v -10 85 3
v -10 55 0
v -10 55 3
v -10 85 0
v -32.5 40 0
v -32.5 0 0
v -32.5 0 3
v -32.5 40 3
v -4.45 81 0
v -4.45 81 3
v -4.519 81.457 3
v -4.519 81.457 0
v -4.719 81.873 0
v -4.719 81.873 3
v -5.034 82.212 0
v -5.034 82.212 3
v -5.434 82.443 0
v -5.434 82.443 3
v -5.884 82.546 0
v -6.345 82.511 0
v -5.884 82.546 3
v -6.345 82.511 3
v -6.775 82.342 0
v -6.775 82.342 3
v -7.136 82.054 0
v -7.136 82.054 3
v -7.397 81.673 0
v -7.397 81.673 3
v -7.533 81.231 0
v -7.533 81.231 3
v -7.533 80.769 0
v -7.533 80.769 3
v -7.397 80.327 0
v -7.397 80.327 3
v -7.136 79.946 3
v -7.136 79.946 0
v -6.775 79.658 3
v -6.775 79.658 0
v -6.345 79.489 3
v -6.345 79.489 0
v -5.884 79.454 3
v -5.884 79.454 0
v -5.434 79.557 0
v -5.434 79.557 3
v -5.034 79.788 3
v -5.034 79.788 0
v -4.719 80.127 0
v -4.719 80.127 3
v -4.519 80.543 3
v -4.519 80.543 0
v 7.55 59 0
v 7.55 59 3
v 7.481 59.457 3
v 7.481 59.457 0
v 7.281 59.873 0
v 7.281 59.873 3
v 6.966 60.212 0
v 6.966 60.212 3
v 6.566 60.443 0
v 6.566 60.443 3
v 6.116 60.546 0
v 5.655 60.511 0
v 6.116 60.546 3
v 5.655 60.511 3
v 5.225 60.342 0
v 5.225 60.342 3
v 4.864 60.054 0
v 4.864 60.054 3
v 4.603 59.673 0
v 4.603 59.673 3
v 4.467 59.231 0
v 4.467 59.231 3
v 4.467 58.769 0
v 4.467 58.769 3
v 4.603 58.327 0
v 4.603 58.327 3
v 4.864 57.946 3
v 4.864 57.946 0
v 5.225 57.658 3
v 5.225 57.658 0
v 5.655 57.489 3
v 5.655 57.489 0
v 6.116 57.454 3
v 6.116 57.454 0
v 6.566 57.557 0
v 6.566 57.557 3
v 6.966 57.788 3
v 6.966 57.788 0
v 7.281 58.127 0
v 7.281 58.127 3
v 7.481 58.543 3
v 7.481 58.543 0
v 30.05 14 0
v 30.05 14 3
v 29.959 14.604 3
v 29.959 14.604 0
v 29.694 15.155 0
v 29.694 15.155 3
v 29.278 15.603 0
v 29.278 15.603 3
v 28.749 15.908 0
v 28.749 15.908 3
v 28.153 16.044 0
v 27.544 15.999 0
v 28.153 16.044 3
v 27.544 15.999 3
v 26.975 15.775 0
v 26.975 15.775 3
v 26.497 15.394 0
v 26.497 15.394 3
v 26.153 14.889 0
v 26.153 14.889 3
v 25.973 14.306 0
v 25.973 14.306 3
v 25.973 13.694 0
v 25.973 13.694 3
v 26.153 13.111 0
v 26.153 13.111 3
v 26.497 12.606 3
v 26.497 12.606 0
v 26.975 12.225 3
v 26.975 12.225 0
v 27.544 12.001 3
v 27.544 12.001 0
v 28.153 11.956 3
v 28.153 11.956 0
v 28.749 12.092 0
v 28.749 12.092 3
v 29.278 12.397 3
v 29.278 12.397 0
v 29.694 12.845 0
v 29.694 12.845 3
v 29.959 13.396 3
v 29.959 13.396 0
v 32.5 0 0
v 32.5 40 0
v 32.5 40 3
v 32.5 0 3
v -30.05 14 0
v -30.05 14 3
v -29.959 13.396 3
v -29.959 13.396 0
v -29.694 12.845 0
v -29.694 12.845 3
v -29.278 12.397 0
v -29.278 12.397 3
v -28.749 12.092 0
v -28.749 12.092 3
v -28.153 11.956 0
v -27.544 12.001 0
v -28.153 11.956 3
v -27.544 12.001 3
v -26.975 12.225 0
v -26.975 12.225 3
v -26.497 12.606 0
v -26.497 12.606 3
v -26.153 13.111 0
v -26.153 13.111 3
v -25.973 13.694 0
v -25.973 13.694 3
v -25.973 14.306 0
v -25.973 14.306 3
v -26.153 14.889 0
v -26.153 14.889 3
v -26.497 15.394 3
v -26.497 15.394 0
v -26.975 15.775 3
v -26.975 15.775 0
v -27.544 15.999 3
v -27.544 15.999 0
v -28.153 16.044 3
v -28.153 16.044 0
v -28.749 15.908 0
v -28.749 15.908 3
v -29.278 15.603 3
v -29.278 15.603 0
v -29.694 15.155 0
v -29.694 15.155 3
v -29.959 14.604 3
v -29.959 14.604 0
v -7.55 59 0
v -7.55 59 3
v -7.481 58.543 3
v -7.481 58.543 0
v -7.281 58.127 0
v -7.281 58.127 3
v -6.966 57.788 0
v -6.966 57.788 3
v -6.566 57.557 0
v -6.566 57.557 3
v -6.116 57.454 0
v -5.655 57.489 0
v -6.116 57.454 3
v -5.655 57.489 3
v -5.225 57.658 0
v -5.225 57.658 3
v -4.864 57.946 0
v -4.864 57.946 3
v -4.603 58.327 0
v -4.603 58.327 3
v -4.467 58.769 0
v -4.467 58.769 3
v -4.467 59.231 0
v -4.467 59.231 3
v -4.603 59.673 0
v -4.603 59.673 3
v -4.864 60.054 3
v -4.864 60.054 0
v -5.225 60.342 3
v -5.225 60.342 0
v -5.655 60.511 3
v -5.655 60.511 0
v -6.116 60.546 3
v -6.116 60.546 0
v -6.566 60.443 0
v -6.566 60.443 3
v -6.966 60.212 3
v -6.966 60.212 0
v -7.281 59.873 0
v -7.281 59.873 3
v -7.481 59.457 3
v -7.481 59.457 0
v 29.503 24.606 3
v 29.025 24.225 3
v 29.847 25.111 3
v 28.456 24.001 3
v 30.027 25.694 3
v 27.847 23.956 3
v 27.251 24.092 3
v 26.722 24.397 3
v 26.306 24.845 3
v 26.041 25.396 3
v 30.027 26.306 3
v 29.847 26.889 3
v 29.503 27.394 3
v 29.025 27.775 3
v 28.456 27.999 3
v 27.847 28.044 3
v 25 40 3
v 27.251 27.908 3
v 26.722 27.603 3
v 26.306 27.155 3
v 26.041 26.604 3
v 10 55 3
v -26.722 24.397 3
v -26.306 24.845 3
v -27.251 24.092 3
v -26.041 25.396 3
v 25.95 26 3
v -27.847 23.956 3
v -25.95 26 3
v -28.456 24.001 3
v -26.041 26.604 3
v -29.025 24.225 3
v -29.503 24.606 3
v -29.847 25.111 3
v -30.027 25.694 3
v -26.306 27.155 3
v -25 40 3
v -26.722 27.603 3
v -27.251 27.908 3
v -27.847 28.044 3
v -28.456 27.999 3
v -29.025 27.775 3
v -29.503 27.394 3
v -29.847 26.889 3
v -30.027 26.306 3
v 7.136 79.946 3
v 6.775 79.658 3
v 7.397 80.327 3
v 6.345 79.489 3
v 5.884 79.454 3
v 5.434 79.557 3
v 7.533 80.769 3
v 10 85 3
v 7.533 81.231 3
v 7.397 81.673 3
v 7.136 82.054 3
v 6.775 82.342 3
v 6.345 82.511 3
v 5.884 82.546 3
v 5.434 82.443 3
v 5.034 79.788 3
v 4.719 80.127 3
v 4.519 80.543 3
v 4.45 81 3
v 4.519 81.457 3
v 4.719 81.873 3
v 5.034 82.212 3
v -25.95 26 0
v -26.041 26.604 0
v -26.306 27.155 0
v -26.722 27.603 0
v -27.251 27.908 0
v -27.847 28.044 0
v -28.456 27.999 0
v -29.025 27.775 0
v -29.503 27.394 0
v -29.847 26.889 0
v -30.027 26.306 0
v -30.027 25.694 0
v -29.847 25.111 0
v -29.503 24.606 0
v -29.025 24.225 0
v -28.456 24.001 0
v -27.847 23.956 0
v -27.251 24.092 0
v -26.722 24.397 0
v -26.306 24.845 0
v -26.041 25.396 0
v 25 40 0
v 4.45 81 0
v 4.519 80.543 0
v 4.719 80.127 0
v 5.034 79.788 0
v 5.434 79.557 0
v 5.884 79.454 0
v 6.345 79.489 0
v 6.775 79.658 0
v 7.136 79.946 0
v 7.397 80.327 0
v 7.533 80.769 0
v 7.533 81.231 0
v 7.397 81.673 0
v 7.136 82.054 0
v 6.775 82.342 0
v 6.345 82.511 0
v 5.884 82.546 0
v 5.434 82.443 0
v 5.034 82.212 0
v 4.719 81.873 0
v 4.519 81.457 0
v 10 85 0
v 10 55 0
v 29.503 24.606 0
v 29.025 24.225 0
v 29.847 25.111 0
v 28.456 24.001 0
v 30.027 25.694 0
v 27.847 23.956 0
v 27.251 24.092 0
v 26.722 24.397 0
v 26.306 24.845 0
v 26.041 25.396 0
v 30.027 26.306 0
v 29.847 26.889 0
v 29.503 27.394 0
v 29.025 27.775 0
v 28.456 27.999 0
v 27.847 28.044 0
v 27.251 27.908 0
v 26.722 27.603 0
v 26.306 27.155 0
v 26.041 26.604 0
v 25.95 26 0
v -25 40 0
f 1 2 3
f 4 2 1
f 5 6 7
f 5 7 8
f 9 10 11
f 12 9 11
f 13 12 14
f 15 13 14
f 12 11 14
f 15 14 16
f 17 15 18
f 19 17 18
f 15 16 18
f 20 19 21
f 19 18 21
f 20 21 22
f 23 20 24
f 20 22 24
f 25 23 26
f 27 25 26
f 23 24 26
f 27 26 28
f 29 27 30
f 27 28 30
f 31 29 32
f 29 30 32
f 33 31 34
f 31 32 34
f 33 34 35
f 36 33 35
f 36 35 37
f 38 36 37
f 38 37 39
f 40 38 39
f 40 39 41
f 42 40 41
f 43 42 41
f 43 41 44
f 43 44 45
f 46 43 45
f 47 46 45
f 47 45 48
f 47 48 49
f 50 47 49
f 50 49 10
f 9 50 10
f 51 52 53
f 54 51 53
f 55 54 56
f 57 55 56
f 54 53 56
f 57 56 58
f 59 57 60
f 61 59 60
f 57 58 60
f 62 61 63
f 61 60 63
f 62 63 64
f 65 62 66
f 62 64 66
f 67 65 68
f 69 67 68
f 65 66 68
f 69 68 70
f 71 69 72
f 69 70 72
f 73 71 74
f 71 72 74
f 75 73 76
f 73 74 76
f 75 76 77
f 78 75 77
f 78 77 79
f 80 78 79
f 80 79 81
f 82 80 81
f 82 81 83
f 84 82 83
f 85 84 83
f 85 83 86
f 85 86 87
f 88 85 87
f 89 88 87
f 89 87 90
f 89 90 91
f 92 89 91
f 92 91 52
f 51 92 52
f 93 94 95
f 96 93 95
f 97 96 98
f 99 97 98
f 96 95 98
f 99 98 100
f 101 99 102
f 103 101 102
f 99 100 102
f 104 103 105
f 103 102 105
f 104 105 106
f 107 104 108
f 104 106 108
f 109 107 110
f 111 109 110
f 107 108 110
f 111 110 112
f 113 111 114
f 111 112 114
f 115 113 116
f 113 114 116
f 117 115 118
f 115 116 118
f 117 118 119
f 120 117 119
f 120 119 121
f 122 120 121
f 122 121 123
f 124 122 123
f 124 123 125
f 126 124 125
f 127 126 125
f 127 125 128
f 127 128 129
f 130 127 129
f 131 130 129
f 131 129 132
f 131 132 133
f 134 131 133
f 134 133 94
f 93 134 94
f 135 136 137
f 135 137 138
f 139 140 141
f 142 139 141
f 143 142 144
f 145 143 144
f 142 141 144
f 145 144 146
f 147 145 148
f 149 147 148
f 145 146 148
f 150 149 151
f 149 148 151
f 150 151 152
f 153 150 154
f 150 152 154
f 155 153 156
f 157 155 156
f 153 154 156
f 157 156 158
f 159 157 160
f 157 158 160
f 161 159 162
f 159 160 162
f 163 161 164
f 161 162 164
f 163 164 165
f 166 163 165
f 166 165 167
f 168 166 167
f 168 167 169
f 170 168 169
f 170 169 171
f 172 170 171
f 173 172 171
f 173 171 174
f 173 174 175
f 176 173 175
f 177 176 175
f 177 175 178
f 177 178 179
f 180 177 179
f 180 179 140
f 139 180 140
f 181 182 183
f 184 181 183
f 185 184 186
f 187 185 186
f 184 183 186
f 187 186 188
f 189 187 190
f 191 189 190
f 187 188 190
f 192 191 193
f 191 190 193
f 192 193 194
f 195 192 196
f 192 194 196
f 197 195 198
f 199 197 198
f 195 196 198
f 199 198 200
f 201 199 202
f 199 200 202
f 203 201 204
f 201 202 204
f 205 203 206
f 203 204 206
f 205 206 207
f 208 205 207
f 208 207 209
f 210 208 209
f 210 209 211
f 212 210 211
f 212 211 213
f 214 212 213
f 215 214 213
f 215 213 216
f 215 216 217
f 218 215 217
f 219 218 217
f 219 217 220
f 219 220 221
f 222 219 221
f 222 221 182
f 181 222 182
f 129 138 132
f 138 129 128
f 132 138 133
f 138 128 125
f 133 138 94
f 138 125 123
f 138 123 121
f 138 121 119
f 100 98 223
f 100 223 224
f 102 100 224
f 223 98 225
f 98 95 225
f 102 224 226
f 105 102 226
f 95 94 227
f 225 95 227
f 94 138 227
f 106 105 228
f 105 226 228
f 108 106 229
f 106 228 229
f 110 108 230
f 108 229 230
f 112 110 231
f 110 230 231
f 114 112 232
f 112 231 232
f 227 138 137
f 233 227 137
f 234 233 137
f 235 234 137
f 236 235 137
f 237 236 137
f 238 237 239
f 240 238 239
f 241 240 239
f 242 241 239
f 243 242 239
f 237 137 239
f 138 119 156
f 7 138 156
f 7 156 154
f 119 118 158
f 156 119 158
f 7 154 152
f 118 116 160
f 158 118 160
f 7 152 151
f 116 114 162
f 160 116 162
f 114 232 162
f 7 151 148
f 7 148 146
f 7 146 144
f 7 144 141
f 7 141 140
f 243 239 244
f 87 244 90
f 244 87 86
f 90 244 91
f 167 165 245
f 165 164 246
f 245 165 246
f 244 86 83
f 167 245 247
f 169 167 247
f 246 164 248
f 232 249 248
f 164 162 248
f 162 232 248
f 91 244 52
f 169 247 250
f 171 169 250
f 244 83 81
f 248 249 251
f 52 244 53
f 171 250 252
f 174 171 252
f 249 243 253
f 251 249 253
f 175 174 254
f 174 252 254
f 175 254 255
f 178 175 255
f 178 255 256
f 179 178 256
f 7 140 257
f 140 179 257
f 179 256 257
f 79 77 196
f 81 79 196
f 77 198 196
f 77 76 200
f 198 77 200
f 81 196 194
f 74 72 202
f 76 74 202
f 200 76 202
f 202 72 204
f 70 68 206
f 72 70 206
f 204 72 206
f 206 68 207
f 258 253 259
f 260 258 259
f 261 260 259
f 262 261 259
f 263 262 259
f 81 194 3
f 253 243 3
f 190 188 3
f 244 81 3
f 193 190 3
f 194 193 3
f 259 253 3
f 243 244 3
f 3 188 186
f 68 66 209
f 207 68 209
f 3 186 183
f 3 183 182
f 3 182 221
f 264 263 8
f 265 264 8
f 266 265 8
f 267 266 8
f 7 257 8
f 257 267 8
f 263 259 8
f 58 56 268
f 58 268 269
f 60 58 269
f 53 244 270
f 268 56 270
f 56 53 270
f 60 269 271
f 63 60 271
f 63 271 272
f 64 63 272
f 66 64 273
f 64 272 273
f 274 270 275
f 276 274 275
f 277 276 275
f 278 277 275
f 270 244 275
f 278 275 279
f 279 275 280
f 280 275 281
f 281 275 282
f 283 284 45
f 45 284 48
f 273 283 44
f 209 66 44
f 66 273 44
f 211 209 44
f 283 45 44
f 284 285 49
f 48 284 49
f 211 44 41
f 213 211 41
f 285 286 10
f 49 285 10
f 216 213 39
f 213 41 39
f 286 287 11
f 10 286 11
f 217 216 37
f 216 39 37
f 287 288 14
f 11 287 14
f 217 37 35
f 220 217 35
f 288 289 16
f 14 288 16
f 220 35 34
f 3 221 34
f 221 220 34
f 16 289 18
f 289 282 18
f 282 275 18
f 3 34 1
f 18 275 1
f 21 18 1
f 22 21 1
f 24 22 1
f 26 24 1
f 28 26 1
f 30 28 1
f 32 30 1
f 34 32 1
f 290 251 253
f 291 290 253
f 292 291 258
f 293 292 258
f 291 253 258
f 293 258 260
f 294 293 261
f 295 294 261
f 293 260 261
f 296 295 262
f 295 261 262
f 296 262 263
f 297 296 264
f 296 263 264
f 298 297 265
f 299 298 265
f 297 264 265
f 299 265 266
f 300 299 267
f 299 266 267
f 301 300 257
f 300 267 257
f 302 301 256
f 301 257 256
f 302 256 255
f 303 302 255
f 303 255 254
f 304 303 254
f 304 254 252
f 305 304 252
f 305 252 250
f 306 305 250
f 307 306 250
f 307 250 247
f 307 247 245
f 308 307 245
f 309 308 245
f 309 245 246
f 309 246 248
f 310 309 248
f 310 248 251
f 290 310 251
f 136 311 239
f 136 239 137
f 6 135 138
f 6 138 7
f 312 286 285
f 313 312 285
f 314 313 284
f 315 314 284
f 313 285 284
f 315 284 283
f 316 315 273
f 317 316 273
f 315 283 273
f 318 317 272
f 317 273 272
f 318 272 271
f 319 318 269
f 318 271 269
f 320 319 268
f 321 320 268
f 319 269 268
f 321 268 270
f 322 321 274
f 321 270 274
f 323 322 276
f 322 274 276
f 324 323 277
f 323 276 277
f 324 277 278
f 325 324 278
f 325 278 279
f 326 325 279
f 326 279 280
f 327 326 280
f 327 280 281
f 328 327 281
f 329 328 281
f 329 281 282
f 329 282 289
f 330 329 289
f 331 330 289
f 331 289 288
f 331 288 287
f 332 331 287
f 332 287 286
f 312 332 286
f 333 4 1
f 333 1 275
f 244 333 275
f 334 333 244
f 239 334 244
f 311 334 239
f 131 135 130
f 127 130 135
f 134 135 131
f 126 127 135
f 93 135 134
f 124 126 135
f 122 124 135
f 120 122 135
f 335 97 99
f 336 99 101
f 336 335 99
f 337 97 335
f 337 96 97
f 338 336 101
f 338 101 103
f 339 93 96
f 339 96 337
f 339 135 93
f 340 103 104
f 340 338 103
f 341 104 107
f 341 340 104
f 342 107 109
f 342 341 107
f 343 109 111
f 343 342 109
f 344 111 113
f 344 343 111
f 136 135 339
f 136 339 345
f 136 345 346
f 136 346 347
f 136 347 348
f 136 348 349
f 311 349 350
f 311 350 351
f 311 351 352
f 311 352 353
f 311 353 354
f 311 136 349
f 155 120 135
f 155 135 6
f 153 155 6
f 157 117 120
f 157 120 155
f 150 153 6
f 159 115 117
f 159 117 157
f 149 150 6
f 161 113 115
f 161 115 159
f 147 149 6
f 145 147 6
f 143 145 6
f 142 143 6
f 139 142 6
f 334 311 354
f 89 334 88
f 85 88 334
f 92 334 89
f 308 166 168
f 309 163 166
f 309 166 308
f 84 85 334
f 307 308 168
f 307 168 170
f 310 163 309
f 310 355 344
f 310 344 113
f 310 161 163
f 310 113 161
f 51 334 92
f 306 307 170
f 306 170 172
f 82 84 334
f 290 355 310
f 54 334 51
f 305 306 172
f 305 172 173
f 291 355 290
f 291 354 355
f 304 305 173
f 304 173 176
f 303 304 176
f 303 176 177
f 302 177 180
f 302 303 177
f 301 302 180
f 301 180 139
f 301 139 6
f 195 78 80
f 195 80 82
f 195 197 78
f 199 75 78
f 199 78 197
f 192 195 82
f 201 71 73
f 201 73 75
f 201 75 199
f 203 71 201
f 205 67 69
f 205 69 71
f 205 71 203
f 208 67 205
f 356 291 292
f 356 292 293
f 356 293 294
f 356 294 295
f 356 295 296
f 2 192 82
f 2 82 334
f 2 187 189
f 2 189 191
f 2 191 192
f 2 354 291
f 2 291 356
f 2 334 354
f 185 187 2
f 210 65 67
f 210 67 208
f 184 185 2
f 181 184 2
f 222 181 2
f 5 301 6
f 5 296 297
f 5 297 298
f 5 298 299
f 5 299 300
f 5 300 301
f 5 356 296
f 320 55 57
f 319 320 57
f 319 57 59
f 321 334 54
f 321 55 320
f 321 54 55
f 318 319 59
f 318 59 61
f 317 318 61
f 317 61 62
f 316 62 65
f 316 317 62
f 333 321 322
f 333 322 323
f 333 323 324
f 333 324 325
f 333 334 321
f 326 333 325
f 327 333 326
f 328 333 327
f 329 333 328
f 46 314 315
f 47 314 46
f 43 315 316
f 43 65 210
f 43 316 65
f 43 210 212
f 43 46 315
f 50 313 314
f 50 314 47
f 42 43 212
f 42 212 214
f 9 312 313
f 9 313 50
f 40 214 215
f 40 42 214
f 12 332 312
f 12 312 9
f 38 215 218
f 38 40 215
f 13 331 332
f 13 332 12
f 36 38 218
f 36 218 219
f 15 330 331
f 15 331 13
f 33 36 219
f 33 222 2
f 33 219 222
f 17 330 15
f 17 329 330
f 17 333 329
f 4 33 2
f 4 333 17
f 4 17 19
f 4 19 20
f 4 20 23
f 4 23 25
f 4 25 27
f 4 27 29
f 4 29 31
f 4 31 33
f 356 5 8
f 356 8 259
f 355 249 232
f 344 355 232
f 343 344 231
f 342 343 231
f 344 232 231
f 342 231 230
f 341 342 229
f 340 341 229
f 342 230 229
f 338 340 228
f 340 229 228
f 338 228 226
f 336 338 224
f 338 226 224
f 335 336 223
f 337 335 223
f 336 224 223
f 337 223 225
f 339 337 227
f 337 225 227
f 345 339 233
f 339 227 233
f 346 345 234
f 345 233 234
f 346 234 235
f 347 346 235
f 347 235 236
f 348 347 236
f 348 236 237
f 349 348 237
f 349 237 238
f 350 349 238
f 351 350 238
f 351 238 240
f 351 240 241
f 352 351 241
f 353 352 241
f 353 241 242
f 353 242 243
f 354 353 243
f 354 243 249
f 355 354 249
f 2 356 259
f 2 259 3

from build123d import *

# Parameters (mm, degrees)
EXTRUDE_1_DEPTH     = 3
SKETCH_2_R          = 1.55
CUT_EXTRUDE_1_DEPTH = 92.050809991
SKETCH_3_R          = 2.05
CUT_EXTRUDE_2_DEPTH = 92.050809991


with BuildPart() as part:
    # 草图1 → 凸台-拉伸1 (new body)
    with BuildSketch(Plane.XY):
        Polygon((-32.5, 40), (-25, 40), (-10, 55), (-10, 85), (10, 85), (10, 55), (25, 40), (32.5, 40), (32.5, 0), (-32.5, 0), align=None)
    extrude(amount=EXTRUDE_1_DEPTH)

    # 草图2 → 切除-拉伸1 (cut, through all)
    with BuildSketch(Plane.XY.offset(3)):
        with Locations((-6, 81)):
            Circle(SKETCH_2_R)
        with Locations(Location((-6, 59, 0), (0, 0, 180))):
            Circle(SKETCH_2_R)
        with Locations((6, 59)):
            Circle(SKETCH_2_R)
        with Locations(Location((6, 81, 0), (0, 0, 180))):
            Circle(SKETCH_2_R)
    extrude(amount=-CUT_EXTRUDE_1_DEPTH, mode=Mode.SUBTRACT)

    # 草图3 → 切除-拉伸2 (cut, through all)
    with BuildSketch(Plane.XY.offset(3)):
        with Locations((-28, 26)):
            Circle(SKETCH_3_R)
        with Locations(Location((-28, 14, 0), (0, 0, 180))):
            Circle(SKETCH_3_R)
        with Locations((28, 14)):
            Circle(SKETCH_3_R)
        with Locations(Location((28, 26, 0), (0, 0, 180))):
            Circle(SKETCH_3_R)
    extrude(amount=-CUT_EXTRUDE_2_DEPTH, mode=Mode.SUBTRACT)


solid = part.part
